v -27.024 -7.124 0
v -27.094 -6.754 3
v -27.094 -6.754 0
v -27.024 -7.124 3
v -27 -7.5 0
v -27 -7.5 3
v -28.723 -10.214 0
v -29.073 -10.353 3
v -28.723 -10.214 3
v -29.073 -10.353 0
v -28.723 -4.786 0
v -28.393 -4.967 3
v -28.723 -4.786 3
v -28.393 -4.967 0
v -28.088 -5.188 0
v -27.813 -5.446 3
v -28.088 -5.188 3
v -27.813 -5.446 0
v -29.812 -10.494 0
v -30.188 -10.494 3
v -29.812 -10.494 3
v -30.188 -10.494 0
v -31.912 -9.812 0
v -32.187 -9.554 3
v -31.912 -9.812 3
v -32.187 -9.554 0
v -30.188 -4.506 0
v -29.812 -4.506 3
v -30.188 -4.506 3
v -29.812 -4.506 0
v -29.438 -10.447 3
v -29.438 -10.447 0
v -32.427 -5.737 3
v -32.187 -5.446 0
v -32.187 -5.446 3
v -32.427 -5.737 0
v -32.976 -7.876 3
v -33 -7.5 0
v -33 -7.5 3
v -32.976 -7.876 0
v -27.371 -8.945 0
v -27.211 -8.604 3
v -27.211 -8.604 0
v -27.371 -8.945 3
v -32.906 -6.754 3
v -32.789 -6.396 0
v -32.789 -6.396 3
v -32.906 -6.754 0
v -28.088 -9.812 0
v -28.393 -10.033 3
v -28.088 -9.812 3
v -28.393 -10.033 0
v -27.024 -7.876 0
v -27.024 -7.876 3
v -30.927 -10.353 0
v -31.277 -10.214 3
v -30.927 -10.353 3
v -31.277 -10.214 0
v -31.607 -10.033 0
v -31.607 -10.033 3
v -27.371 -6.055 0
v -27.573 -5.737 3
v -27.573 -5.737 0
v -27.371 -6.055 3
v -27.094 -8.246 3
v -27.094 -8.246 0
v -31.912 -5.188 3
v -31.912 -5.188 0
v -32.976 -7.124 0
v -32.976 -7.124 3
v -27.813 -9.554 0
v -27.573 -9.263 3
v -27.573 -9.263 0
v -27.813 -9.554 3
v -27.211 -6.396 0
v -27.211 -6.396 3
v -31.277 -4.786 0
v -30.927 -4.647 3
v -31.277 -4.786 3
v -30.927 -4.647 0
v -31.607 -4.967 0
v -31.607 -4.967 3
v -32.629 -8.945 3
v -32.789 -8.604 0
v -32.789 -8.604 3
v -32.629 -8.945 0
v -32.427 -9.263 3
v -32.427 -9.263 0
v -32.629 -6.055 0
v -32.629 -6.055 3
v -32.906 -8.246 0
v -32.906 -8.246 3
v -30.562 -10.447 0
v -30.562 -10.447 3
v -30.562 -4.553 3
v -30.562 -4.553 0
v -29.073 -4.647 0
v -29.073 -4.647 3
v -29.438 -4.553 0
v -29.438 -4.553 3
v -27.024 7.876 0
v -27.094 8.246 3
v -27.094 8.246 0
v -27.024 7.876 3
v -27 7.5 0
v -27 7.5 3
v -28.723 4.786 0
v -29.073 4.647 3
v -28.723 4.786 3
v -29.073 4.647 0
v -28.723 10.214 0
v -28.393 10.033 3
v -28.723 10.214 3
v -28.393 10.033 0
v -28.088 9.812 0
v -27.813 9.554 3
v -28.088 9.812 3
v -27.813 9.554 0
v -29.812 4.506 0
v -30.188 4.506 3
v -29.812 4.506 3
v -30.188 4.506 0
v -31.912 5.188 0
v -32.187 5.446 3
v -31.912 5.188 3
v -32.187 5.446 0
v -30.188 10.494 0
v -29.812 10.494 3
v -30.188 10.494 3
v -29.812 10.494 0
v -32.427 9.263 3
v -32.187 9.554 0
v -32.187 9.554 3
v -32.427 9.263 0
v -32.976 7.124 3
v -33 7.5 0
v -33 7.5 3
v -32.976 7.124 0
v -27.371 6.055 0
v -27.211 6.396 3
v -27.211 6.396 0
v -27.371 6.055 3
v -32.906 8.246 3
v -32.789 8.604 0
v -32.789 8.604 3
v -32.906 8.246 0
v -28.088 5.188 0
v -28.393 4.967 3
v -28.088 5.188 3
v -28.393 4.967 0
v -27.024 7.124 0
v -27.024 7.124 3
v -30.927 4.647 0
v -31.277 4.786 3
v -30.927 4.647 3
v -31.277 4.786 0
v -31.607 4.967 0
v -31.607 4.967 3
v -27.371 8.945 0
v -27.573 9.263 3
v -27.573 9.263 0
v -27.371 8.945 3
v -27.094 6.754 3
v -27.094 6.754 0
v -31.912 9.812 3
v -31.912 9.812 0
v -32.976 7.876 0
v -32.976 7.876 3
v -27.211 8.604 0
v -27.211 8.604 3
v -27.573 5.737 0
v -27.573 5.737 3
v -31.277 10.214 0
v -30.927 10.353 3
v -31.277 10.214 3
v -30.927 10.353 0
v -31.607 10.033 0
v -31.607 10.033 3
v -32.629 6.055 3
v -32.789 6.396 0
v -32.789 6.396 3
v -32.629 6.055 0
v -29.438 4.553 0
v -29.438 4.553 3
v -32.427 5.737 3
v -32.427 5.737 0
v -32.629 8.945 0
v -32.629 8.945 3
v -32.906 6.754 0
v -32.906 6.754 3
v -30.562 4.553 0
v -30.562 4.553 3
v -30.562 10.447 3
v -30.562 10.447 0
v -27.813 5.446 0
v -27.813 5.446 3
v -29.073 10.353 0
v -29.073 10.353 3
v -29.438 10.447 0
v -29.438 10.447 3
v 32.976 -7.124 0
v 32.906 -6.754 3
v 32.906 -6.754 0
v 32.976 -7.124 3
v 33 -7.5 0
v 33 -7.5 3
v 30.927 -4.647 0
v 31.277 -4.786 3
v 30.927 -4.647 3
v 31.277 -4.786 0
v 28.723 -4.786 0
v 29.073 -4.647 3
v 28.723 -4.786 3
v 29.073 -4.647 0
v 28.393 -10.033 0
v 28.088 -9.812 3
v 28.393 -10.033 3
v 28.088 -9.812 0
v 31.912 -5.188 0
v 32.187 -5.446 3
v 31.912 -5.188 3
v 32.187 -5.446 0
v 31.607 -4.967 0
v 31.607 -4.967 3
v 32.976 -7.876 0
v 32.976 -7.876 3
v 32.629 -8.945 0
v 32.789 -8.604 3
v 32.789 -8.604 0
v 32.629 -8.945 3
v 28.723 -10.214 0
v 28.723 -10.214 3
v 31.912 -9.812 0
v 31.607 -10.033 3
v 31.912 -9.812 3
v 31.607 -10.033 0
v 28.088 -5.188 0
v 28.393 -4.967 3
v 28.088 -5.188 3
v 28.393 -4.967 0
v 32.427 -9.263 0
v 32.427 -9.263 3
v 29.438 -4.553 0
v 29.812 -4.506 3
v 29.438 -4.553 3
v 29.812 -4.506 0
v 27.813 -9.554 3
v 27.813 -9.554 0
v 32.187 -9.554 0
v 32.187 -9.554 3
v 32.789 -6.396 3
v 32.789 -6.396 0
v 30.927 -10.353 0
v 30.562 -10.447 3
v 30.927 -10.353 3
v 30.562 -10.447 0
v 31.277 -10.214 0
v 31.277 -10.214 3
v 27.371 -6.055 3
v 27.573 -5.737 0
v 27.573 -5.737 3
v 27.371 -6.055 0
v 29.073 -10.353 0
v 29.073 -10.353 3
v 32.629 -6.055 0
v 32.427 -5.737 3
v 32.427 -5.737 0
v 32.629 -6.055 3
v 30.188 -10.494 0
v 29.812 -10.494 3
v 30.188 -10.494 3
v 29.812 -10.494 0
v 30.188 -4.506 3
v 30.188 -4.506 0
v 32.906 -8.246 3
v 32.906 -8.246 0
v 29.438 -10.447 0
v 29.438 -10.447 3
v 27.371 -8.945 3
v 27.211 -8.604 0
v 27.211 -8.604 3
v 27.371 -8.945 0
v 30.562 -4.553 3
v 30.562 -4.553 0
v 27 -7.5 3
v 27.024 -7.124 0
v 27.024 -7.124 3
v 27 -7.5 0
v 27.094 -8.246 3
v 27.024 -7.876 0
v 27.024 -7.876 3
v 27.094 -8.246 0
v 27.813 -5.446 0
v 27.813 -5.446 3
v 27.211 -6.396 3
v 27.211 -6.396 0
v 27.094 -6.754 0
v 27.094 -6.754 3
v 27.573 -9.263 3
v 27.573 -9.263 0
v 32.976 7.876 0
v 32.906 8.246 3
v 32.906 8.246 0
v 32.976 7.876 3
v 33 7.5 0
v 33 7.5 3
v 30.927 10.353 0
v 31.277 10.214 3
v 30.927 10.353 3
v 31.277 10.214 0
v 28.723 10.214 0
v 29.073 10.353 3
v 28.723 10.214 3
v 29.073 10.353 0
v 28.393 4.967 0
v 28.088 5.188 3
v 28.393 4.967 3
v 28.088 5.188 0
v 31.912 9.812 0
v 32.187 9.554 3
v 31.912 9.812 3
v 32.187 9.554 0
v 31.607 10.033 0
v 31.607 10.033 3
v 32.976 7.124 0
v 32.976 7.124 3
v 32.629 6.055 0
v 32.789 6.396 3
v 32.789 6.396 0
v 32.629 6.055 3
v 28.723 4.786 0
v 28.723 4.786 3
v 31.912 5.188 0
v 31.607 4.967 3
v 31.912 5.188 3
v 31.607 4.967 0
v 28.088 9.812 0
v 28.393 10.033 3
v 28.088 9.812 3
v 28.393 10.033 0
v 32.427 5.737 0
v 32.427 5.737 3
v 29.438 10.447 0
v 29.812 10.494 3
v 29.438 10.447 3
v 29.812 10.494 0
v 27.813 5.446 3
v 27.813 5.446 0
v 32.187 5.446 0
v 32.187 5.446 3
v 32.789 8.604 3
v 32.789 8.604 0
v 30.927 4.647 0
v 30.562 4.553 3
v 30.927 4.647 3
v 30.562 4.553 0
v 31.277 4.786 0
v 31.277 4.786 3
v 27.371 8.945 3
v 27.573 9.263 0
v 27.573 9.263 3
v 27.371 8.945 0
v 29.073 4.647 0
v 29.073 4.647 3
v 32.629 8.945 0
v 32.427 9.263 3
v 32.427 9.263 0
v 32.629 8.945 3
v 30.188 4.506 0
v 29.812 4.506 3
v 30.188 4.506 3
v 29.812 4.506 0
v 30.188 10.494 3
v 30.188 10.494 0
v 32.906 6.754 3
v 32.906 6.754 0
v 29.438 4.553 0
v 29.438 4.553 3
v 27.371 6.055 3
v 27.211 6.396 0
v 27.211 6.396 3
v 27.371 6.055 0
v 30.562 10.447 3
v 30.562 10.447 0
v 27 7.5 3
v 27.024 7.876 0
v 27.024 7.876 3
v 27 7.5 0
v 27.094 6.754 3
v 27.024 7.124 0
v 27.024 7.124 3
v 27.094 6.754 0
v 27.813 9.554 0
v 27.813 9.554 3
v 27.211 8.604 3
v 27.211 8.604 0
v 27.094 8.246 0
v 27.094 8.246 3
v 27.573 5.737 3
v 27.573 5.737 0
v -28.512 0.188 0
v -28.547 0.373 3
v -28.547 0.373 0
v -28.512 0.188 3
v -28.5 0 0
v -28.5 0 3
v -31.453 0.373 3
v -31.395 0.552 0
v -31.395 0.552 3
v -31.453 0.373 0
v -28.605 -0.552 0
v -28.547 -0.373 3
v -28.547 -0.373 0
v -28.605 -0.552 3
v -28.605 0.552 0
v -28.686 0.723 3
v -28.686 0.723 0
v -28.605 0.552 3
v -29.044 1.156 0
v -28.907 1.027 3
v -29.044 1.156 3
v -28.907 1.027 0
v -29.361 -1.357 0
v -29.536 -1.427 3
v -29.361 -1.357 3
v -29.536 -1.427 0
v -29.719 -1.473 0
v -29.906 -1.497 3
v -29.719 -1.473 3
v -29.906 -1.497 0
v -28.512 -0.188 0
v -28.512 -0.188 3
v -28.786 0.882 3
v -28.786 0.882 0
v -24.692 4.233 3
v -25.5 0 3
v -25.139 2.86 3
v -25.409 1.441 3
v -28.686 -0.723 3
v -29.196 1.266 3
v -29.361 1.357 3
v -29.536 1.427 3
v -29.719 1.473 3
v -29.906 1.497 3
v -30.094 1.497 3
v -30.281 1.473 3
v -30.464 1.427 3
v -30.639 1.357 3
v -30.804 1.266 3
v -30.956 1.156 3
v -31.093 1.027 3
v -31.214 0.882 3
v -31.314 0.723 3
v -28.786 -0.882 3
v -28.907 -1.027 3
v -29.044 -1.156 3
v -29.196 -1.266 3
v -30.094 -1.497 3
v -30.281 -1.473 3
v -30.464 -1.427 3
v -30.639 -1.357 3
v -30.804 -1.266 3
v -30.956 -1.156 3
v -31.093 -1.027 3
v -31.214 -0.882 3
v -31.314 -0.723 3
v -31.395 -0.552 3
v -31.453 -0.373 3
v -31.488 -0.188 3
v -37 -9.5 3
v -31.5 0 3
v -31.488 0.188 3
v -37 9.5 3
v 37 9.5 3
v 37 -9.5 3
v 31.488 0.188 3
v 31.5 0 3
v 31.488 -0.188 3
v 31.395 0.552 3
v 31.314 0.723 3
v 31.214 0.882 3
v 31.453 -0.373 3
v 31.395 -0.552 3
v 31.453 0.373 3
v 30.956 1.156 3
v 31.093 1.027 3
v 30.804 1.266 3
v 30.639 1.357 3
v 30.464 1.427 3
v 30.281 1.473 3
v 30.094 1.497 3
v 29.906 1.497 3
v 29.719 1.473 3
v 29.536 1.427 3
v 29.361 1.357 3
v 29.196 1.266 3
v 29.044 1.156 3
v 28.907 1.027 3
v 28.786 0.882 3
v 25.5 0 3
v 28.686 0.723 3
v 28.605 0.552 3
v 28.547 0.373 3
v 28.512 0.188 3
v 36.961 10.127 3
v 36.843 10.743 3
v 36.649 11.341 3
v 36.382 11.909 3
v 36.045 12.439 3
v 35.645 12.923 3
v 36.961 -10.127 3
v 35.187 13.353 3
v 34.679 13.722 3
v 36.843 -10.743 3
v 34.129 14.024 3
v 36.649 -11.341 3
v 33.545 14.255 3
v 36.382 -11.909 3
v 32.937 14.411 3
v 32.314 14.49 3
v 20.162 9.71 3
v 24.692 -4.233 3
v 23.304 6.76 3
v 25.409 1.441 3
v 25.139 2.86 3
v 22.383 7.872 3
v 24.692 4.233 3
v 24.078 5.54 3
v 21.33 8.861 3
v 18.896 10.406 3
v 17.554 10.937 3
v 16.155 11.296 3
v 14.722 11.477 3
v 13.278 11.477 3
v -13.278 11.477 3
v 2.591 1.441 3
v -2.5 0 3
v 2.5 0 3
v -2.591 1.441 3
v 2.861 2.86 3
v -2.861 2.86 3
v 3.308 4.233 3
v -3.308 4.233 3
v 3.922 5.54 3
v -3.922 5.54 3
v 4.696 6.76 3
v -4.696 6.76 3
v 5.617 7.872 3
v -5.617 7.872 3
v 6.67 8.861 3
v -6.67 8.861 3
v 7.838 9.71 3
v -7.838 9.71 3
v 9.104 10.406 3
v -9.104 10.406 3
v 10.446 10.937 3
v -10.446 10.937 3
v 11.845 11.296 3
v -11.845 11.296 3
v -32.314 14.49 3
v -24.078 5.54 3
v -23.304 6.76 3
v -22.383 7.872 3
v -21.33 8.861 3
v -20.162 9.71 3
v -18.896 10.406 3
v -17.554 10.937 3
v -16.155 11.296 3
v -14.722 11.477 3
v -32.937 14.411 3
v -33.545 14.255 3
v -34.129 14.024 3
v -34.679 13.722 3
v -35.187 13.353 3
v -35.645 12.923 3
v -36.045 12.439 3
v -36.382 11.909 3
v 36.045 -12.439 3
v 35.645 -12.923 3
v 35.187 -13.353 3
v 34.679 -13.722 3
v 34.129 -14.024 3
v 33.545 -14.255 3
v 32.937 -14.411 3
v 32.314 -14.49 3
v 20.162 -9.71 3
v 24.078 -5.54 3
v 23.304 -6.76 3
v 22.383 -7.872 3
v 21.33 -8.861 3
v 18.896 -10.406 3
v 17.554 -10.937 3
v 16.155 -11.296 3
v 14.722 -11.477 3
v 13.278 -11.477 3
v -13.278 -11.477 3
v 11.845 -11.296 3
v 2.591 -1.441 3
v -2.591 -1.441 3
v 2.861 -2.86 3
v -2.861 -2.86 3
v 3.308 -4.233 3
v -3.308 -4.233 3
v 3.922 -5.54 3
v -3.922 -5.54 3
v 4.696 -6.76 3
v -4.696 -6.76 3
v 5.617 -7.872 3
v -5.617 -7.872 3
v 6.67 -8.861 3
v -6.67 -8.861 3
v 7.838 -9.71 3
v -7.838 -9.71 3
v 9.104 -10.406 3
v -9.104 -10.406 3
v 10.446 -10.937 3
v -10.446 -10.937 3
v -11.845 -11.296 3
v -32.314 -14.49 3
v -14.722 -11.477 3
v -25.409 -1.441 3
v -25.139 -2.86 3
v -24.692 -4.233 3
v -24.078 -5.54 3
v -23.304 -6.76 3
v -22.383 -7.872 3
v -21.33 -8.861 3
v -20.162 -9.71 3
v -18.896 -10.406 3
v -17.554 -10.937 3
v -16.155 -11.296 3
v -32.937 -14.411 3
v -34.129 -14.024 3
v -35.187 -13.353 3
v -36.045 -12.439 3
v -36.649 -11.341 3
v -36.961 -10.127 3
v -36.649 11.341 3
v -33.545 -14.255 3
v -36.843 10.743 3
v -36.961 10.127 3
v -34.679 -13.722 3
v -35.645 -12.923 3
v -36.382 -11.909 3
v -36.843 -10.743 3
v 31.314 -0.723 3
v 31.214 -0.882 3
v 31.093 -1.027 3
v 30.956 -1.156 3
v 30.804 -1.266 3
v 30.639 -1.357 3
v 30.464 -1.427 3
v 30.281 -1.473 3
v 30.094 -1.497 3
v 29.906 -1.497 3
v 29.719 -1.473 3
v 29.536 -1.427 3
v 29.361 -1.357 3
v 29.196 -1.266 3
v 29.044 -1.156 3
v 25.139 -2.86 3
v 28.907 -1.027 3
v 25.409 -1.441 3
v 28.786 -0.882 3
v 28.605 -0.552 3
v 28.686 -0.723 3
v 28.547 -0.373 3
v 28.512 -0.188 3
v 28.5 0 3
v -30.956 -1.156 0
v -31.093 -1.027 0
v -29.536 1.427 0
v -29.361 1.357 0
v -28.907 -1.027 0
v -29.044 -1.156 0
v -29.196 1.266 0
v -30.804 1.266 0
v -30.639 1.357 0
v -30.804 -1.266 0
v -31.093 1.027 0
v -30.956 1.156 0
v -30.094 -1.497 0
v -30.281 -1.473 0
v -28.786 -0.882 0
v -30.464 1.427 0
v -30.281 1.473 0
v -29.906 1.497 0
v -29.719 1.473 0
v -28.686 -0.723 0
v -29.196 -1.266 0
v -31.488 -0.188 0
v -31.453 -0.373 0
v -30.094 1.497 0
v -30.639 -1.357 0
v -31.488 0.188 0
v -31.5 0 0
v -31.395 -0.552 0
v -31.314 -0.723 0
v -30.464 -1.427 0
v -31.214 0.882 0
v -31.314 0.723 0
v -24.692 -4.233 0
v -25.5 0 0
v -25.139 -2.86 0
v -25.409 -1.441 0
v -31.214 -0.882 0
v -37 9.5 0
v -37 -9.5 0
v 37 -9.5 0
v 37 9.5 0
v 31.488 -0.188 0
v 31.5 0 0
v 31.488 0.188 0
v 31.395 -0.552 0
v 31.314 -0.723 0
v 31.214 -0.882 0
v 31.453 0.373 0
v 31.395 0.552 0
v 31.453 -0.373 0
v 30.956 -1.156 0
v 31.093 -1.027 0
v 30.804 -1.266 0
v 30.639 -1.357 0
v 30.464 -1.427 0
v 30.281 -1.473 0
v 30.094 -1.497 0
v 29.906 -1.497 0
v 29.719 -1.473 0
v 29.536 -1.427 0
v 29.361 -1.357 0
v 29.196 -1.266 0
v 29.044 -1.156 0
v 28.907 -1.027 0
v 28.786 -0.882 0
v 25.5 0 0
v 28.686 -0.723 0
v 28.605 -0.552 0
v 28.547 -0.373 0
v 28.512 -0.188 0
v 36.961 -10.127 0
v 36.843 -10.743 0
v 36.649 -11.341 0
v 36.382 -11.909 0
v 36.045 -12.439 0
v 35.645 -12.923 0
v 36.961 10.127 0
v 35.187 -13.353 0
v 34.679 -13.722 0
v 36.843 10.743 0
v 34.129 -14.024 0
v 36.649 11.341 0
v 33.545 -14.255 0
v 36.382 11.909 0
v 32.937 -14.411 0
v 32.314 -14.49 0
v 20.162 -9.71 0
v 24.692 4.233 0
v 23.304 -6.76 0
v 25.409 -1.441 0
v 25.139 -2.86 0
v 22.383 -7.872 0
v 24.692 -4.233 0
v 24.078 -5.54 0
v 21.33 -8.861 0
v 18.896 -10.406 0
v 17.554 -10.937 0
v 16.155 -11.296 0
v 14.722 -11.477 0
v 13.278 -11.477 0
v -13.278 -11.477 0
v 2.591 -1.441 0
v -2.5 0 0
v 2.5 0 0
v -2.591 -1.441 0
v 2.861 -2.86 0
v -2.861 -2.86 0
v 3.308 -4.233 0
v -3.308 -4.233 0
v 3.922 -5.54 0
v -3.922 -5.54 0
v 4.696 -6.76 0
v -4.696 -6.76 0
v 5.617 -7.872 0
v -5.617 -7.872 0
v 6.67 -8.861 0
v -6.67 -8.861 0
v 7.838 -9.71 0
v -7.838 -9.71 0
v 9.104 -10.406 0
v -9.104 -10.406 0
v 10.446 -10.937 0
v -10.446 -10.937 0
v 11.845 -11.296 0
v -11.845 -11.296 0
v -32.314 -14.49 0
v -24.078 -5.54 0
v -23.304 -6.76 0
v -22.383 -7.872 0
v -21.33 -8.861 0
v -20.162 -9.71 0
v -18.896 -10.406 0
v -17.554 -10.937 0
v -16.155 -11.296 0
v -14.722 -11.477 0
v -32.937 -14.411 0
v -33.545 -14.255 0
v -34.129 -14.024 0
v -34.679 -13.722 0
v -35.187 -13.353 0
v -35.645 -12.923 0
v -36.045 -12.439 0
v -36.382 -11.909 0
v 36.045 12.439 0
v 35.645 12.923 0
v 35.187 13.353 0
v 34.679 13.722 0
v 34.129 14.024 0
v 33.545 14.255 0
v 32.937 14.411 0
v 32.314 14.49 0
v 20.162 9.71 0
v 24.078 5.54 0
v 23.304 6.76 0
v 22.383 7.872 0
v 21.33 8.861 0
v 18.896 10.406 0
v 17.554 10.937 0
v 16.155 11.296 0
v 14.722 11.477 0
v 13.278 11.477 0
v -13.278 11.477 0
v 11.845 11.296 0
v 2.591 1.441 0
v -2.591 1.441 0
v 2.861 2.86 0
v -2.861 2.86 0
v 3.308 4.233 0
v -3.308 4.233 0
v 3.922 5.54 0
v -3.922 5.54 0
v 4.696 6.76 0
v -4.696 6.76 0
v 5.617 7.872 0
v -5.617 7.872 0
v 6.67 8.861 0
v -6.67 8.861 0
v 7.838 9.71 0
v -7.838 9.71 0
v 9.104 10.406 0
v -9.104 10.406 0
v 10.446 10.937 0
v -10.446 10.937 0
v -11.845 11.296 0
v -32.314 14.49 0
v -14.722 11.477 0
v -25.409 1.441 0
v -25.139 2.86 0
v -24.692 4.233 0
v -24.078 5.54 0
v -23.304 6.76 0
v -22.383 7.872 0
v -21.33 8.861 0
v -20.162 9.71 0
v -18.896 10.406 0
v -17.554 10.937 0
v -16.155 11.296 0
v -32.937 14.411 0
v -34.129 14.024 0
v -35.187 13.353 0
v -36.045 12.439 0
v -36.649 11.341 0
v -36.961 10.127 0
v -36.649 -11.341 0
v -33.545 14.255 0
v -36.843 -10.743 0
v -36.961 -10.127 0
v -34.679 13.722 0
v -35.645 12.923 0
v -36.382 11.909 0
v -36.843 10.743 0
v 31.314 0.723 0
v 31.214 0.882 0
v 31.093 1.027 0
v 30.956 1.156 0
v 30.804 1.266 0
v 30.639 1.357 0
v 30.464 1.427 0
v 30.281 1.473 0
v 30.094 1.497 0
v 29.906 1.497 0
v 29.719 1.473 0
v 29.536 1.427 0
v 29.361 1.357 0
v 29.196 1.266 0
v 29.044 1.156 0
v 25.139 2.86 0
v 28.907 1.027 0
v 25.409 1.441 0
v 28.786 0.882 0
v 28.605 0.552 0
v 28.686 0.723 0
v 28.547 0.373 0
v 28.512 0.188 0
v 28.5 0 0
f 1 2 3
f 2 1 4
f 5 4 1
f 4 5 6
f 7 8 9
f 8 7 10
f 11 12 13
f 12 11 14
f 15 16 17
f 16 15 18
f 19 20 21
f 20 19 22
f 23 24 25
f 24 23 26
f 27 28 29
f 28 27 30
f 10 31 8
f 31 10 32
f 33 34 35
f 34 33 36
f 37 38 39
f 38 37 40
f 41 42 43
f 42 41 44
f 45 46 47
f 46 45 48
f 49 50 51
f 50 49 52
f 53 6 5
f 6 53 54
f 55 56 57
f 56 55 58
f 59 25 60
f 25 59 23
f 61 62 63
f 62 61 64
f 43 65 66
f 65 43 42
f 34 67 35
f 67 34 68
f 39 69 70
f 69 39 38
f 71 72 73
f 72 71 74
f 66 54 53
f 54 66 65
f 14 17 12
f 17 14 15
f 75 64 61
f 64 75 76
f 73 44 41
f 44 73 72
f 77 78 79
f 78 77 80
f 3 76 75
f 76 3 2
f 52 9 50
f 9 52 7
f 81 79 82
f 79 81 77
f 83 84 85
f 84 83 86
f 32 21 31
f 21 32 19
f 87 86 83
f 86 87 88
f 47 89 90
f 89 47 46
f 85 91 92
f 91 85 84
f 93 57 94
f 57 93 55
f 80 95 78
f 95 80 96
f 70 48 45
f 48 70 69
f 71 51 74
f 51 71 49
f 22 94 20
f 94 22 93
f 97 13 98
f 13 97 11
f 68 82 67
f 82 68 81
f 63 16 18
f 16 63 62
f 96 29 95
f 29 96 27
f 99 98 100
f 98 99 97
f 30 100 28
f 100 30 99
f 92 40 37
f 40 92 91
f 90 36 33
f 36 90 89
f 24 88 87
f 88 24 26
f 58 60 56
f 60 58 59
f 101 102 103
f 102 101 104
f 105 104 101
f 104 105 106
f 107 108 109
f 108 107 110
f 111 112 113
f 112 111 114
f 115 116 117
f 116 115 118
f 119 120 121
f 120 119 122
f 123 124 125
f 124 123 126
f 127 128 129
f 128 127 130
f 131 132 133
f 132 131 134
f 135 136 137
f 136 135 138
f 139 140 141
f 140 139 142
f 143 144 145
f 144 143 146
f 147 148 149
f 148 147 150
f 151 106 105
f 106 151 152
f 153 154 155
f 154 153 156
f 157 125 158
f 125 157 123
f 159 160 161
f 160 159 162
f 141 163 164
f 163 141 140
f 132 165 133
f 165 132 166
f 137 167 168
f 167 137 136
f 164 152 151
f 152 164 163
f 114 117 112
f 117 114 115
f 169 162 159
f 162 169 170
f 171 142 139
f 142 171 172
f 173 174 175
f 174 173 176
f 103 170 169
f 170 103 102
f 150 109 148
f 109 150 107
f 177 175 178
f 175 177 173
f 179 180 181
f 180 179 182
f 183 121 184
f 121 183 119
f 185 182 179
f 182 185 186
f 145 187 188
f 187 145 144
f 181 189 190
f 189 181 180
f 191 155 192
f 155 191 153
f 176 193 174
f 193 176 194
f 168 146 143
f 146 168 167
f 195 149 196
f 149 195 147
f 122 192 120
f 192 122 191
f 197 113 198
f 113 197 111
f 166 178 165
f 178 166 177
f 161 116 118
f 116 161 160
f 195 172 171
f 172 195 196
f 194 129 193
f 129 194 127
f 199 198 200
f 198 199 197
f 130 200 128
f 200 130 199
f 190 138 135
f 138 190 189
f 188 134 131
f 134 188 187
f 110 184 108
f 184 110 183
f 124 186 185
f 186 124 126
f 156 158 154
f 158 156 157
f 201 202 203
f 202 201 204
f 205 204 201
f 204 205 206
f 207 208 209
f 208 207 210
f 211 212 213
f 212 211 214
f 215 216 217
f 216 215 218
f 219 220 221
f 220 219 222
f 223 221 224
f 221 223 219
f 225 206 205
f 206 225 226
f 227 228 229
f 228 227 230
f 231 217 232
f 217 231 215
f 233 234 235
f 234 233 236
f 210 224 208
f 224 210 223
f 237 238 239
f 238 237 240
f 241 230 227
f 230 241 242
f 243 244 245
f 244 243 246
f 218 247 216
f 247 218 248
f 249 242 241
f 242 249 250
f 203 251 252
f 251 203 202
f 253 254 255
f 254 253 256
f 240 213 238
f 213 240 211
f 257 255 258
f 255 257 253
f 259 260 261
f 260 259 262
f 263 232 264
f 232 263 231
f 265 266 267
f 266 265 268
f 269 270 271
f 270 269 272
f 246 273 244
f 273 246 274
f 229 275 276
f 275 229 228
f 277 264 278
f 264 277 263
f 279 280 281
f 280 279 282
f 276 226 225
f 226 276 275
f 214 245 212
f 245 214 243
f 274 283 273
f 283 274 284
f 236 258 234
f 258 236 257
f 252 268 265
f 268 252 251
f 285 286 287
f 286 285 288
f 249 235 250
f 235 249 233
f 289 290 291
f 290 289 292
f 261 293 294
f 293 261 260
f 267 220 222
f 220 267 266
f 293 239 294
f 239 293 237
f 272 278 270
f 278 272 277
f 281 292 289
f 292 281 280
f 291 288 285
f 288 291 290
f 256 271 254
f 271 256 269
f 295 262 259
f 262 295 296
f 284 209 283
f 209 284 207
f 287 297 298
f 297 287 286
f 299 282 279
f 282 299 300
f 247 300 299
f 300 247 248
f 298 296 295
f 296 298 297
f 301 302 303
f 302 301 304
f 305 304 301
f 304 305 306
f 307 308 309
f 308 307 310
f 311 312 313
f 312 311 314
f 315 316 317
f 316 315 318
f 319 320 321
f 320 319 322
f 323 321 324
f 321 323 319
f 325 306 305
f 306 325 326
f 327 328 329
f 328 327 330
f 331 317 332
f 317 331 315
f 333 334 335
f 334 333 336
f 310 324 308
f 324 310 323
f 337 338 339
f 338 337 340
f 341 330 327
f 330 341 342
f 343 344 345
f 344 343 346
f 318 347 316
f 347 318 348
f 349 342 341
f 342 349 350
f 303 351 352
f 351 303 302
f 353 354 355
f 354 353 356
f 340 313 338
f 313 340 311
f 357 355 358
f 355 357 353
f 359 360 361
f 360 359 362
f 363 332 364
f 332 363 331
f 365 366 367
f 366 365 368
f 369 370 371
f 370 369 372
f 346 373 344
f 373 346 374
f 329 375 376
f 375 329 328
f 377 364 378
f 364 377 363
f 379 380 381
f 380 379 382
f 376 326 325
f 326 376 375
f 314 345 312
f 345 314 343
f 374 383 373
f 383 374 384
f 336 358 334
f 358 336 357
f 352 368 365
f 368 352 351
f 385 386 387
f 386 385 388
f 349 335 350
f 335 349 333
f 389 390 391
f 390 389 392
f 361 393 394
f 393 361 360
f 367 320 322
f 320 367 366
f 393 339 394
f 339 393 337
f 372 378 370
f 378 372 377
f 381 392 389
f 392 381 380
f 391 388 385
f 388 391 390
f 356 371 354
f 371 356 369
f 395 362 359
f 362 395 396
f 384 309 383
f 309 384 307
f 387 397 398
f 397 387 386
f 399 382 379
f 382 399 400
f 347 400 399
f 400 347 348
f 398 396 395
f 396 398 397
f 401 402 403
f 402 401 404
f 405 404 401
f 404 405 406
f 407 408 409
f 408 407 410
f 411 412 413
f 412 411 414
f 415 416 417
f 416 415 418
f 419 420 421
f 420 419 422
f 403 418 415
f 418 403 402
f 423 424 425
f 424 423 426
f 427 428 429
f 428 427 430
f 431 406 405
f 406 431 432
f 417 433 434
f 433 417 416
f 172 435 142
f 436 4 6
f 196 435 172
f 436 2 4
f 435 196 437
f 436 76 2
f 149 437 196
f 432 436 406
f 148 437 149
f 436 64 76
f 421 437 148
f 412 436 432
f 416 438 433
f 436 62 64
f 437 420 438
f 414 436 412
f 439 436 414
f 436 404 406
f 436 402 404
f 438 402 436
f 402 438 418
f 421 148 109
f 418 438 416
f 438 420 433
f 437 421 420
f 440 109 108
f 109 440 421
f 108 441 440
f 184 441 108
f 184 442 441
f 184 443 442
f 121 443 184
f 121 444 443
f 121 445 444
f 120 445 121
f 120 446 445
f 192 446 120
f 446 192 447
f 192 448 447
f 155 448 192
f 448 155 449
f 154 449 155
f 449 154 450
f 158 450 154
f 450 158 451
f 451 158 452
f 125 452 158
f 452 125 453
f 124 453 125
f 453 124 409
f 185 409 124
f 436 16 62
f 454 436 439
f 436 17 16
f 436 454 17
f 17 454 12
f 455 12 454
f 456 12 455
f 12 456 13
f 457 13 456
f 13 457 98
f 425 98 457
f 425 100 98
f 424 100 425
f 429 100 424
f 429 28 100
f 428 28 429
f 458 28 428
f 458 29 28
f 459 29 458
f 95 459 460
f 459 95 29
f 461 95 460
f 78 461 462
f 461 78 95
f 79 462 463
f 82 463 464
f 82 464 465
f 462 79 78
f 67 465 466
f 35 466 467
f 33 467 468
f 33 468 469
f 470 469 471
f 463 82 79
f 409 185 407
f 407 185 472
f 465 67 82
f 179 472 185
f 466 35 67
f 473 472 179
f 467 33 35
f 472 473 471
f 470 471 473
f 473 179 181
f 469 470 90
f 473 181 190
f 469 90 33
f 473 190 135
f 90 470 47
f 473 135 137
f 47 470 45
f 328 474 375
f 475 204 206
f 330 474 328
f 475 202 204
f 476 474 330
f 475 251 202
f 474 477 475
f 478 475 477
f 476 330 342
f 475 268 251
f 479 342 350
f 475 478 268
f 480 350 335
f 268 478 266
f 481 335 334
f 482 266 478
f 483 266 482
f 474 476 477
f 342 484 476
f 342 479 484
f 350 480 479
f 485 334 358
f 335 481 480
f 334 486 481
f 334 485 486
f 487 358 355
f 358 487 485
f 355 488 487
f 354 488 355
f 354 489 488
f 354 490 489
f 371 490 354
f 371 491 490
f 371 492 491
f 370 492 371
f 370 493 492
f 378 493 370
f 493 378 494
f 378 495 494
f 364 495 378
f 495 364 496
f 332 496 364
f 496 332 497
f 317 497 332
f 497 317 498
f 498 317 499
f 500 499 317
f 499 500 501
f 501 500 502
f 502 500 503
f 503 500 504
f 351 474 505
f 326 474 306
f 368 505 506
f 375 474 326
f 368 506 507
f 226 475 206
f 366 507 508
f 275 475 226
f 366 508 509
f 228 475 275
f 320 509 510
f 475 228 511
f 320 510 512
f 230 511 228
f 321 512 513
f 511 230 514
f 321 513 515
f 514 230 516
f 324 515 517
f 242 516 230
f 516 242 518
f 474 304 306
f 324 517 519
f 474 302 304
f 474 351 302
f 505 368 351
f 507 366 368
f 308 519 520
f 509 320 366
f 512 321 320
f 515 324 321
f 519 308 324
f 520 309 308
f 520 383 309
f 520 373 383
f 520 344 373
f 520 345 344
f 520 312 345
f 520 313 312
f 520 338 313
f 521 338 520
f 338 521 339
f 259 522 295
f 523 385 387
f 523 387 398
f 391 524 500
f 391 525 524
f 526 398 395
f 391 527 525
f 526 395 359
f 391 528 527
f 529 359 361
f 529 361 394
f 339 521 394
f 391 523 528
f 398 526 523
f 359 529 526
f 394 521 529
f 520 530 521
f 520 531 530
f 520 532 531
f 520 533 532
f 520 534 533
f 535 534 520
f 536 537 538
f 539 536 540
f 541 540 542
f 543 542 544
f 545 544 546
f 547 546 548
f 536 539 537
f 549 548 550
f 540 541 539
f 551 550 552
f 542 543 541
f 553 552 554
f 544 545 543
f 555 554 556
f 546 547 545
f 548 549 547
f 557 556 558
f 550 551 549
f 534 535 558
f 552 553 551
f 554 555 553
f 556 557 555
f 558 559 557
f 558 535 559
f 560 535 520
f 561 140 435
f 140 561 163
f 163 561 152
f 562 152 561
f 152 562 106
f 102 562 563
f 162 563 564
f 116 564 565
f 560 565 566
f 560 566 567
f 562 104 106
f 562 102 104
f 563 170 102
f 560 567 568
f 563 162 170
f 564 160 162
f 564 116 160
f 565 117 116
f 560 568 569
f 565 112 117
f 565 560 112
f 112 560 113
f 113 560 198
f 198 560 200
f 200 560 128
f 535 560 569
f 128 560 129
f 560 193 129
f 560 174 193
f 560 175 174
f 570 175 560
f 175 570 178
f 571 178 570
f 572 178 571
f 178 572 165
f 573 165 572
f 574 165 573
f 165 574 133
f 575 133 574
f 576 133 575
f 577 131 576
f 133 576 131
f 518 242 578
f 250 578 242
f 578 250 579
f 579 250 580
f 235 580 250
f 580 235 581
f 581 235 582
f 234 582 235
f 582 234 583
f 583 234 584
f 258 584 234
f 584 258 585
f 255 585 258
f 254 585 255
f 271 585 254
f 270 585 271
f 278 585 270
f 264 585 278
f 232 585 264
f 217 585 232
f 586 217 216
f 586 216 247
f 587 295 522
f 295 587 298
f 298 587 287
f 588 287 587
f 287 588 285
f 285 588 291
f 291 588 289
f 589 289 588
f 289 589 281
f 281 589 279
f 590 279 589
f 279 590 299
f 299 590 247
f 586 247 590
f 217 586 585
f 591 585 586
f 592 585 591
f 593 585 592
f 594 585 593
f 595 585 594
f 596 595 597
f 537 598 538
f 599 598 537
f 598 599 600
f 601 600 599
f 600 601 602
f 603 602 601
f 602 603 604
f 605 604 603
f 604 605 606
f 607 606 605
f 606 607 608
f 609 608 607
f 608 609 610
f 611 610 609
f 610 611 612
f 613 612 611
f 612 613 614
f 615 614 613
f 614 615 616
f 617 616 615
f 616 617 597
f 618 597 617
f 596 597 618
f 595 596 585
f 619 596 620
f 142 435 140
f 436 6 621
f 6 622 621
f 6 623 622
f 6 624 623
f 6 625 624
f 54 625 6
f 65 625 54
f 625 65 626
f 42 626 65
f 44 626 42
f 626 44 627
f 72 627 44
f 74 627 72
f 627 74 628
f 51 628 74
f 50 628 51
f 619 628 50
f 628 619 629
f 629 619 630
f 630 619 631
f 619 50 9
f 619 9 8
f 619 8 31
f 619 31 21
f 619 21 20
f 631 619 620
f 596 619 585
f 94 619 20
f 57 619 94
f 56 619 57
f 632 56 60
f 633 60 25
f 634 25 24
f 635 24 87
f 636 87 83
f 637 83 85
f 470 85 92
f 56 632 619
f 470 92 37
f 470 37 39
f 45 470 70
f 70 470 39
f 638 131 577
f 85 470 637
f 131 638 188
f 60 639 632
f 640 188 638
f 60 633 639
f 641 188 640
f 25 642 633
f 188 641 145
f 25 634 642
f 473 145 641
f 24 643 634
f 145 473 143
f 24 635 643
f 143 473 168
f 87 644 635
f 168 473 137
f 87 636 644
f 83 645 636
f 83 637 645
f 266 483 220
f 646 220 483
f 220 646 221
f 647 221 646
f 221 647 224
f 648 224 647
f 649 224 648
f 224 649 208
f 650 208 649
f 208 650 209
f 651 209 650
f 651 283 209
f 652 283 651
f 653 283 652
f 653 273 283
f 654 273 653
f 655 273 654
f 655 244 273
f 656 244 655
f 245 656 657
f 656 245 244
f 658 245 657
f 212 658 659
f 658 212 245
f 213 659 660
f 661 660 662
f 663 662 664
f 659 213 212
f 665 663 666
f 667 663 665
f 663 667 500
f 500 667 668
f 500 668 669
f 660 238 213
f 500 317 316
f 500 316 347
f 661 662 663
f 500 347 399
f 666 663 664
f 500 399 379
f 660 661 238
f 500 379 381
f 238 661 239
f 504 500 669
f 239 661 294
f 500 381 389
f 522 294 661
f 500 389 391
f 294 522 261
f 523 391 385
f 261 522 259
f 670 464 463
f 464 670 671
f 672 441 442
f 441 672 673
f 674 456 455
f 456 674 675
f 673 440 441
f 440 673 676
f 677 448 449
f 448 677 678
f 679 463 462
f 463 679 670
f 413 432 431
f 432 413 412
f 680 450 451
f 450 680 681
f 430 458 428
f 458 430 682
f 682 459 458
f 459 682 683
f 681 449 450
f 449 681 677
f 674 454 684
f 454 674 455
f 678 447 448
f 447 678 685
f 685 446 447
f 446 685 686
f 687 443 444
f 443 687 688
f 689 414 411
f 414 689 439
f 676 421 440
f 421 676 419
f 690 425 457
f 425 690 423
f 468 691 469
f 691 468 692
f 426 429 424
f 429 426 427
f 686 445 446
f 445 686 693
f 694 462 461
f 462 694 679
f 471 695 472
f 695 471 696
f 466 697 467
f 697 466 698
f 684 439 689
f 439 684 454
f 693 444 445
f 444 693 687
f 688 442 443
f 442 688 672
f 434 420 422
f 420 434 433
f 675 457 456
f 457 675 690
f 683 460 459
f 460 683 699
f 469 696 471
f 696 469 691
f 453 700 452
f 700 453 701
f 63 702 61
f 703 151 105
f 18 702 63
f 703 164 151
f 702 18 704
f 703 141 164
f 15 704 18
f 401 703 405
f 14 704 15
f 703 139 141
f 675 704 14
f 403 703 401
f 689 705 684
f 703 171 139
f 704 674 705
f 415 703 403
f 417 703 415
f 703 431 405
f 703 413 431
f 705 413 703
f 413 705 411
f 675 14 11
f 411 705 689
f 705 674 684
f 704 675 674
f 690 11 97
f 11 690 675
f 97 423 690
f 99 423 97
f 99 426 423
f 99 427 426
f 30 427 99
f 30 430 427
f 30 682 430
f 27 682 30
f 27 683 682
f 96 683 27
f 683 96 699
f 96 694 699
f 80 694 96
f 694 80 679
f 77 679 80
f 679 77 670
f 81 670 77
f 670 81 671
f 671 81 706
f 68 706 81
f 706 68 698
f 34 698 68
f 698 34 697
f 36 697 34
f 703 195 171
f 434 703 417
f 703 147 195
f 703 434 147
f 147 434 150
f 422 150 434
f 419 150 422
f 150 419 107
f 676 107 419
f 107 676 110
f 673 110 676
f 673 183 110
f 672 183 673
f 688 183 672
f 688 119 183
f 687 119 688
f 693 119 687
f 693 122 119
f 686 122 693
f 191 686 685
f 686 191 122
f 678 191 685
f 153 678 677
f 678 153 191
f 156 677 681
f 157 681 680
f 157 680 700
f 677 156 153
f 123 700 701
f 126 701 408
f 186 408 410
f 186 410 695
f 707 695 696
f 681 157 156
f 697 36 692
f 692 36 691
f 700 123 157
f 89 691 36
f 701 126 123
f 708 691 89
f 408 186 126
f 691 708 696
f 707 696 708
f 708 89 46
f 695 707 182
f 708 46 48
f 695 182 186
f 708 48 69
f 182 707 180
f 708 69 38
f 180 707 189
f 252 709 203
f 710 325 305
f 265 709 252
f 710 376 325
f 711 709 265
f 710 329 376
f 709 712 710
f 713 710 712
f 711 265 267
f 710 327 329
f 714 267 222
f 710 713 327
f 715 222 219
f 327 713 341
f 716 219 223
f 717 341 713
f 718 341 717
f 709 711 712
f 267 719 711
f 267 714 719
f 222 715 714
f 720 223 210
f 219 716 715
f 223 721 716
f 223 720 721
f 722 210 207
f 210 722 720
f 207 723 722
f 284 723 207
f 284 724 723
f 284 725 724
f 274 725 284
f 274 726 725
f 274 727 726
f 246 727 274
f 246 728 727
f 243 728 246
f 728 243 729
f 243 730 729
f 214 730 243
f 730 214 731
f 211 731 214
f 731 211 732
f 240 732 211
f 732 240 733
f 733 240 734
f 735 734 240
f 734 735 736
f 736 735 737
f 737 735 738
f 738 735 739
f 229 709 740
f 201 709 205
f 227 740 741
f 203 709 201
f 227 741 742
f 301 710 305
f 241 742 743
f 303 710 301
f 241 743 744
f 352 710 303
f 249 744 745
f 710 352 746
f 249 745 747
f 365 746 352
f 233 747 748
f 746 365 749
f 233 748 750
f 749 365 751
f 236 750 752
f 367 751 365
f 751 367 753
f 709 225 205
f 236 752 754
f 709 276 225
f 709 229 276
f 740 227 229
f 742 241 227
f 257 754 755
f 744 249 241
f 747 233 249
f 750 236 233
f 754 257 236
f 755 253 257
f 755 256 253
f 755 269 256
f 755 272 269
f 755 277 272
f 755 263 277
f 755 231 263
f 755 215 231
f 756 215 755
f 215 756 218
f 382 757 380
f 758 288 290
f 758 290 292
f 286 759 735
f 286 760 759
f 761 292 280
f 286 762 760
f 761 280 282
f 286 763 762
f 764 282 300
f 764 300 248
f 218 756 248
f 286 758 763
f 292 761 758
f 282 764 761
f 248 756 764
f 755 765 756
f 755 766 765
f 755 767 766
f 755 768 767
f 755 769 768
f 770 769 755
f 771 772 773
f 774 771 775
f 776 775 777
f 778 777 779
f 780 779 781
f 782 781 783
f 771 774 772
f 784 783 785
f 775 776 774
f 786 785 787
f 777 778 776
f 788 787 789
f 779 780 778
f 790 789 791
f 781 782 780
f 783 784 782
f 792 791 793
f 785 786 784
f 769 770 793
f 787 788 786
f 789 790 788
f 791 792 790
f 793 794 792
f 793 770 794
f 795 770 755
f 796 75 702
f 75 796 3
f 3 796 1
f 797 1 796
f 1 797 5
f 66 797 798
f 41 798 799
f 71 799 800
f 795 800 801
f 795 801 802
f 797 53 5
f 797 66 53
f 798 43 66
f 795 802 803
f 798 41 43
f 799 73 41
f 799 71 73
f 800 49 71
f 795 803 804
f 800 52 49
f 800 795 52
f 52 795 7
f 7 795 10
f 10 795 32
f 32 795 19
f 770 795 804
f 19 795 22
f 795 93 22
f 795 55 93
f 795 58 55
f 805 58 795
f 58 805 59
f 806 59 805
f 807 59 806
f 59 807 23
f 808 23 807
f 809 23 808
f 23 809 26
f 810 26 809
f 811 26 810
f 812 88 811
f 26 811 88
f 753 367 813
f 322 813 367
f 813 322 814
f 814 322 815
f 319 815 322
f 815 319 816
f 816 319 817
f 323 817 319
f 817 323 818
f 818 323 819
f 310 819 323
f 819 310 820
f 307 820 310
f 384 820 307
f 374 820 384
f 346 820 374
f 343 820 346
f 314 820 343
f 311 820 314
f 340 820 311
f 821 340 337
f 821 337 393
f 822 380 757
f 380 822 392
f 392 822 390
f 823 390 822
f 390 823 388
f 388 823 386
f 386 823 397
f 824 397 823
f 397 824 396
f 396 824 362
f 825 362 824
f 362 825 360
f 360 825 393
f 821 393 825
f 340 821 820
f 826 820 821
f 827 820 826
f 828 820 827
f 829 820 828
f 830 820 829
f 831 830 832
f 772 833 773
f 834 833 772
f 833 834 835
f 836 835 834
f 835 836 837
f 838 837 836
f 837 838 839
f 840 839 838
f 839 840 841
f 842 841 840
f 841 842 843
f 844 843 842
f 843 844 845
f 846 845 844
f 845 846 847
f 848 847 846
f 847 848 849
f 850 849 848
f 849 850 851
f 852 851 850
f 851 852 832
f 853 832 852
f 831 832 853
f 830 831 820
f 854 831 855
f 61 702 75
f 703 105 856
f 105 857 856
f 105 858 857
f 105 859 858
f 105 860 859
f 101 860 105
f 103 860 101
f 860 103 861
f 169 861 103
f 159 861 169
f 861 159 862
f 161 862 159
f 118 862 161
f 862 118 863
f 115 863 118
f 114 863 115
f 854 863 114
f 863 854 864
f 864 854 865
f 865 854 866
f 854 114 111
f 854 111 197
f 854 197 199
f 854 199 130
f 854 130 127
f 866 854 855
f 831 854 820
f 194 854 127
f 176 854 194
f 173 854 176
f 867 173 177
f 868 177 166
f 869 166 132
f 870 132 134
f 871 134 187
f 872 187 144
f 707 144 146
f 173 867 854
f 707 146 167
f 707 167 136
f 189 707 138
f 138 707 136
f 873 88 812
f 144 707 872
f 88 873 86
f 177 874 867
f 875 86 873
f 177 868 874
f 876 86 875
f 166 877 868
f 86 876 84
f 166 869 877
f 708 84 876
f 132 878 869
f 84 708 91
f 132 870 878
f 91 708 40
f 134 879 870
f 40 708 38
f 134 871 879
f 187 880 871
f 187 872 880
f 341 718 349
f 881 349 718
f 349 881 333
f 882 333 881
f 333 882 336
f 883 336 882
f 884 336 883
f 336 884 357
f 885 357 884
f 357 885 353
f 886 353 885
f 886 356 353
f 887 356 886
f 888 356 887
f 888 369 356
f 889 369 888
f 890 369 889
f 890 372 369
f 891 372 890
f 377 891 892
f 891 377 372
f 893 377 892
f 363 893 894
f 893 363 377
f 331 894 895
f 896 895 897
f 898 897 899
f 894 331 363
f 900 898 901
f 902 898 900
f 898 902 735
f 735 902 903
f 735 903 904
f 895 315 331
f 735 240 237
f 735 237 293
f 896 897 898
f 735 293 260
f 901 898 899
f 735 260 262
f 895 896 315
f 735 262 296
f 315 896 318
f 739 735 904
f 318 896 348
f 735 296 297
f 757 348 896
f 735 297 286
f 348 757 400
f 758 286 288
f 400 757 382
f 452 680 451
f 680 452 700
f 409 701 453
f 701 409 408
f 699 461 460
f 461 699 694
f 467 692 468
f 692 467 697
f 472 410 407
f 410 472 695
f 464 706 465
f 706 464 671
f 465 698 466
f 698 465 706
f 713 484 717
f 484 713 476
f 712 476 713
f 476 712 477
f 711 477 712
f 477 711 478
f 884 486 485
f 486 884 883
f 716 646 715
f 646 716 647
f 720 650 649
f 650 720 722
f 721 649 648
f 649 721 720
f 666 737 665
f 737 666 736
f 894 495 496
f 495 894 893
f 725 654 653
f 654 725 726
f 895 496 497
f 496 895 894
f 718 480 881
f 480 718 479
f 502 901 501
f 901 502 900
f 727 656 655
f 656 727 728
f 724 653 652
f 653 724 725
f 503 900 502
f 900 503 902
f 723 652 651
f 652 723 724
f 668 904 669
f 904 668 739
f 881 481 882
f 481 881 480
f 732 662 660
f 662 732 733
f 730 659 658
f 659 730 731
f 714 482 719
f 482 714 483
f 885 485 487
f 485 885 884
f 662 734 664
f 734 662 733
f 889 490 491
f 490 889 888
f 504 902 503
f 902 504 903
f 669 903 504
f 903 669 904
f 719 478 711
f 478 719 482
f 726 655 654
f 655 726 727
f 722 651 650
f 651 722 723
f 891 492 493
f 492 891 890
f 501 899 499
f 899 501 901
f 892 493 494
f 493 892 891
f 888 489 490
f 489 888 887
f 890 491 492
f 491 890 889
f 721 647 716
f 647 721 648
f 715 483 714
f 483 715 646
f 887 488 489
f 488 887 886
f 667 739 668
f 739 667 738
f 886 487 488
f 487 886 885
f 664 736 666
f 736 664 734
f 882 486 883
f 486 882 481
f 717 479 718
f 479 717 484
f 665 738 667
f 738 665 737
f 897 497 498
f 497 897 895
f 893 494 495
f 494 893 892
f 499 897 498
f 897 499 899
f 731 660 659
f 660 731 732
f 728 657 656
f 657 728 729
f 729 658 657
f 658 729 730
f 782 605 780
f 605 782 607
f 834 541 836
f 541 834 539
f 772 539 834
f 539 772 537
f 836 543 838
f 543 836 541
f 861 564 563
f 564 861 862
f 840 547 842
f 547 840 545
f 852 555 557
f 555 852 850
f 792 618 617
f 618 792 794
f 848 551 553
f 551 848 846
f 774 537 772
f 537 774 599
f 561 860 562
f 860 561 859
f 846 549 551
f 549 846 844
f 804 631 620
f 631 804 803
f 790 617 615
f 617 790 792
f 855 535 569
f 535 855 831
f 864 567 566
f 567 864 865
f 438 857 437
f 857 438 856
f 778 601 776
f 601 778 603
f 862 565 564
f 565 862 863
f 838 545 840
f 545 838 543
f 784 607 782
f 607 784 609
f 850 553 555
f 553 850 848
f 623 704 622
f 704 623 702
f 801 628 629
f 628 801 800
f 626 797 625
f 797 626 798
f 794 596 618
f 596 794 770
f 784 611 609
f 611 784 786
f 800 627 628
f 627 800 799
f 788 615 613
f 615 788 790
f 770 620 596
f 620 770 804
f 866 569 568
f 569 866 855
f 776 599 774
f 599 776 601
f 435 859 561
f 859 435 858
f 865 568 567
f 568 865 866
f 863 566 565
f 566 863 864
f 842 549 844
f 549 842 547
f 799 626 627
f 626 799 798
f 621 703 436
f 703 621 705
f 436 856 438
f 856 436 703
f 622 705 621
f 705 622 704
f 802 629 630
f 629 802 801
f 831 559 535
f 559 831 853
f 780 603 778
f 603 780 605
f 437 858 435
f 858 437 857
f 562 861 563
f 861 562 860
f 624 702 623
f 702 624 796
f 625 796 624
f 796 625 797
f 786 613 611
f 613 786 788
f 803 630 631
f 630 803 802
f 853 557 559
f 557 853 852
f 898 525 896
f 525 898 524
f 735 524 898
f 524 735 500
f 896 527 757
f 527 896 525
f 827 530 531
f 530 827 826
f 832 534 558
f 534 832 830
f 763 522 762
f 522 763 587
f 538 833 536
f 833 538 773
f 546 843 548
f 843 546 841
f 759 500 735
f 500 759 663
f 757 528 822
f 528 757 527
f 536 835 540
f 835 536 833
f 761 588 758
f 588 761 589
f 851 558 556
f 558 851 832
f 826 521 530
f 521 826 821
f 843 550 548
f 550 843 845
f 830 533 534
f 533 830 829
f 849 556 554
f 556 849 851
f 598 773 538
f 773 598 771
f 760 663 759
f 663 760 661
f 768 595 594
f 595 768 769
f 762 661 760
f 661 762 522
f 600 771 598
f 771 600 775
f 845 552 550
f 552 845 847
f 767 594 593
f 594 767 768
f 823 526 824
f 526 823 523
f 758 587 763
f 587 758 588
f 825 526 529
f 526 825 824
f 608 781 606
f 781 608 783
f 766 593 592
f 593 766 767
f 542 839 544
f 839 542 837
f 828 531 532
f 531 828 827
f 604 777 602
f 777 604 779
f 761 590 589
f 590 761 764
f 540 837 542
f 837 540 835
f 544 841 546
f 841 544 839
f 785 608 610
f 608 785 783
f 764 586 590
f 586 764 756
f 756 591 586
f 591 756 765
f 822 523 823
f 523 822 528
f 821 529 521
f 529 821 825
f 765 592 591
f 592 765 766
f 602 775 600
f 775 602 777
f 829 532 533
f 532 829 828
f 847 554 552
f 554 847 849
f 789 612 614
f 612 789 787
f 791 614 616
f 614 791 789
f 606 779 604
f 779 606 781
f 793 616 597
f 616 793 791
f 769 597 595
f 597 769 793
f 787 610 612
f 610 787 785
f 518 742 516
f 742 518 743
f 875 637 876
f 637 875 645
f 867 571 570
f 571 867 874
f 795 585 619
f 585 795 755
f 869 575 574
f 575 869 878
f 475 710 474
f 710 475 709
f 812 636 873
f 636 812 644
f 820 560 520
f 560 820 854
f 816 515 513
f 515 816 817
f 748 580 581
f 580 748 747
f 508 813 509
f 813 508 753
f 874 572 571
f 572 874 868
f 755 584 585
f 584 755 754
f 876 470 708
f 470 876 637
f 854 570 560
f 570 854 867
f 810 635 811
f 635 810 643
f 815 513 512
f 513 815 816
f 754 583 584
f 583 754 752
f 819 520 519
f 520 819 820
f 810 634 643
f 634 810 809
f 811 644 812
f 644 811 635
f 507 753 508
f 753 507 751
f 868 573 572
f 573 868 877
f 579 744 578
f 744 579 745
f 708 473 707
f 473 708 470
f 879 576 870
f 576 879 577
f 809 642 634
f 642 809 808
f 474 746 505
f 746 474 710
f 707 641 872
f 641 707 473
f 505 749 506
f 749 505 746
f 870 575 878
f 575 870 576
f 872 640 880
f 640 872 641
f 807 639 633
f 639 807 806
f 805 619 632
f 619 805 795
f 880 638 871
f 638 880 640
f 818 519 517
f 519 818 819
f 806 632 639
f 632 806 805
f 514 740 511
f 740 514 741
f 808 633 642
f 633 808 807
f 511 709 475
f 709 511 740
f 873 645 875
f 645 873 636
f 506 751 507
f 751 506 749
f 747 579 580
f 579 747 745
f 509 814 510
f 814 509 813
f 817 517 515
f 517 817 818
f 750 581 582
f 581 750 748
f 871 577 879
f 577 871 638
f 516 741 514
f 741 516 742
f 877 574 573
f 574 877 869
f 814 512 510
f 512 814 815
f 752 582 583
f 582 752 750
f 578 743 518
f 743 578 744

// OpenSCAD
$fn = 50;


difference() {
	union() {
		hull() {
			translate(v = [-32.0000000000, 9.5000000000, 0]) {
				cylinder(h = 3, r = 5);
			}
			translate(v = [32.0000000000, 9.5000000000, 0]) {
				cylinder(h = 3, r = 5);
			}
			translate(v = [-32.0000000000, -9.5000000000, 0]) {
				cylinder(h = 3, r = 5);
			}
			translate(v = [32.0000000000, -9.5000000000, 0]) {
				cylinder(h = 3, r = 5);
			}
		}
	}
	union() {
		#translate(v = [-30.0000000000, -7.5000000000, 0]) {
			cylinder(h = 3, r = 3.0000000000);
		}
		#translate(v = [-30.0000000000, 7.5000000000, 0]) {
			cylinder(h = 3, r = 3.0000000000);
		}
		#translate(v = [30.0000000000, -7.5000000000, 0]) {
			cylinder(h = 3, r = 3.0000000000);
		}
		#translate(v = [30.0000000000, 7.5000000000, 0]) {
			cylinder(h = 3, r = 3.0000000000);
		}
		#translate(v = [-30.0000000000, -7.5000000000, -100.0000000000]) {
			cylinder(h = 200, r = 3.0000000000);
		}
		#translate(v = [-30.0000000000, 7.5000000000, -100.0000000000]) {
			cylinder(h = 200, r = 3.0000000000);
		}
		#translate(v = [30.0000000000, -7.5000000000, -100.0000000000]) {
			cylinder(h = 200, r = 3.0000000000);
		}
		#translate(v = [30.0000000000, 7.5000000000, -100.0000000000]) {
			cylinder(h = 200, r = 3.0000000000);
		}
		#translate(v = [-30.0000000000, -7.5000000000, 0]) {
			cylinder(h = 3, r = 1.5000000000);
		}
		#translate(v = [-30.0000000000, 0.0000000000, 0]) {
			cylinder(h = 3, r = 1.5000000000);
		}
		#translate(v = [-30.0000000000, 7.5000000000, 0]) {
			cylinder(h = 3, r = 1.5000000000);
		}
		#translate(v = [30.0000000000, -7.5000000000, 0]) {
			cylinder(h = 3, r = 1.5000000000);
		}
		#translate(v = [30.0000000000, 0.0000000000, 0]) {
			cylinder(h = 3, r = 1.5000000000);
		}
		#translate(v = [30.0000000000, 7.5000000000, 0]) {
			cylinder(h = 3, r = 1.5000000000);
		}
		#translate(v = [-30.0000000000, -7.5000000000, 0]) {
			cylinder(h = 3, r = 1.5000000000);
		}
		#translate(v = [-30.0000000000, 0.0000000000, 0]) {
			cylinder(h = 3, r = 1.5000000000);
		}
		#translate(v = [-30.0000000000, 7.5000000000, 0]) {
			cylinder(h = 3, r = 1.5000000000);
		}
		#translate(v = [30.0000000000, -7.5000000000, 0]) {
			cylinder(h = 3, r = 1.5000000000);
		}
		#translate(v = [30.0000000000, 0.0000000000, 0]) {
			cylinder(h = 3, r = 1.5000000000);
		}
		#translate(v = [30.0000000000, 7.5000000000, 0]) {
			cylinder(h = 3, r = 1.5000000000);
		}
		#translate(v = [-30.0000000000, -7.5000000000, 0]) {
			cylinder(h = 3, r = 1.5000000000);
		}
		#translate(v = [-30.0000000000, 0.0000000000, 0]) {
			cylinder(h = 3, r = 1.5000000000);
		}
		#translate(v = [-30.0000000000, 7.5000000000, 0]) {
			cylinder(h = 3, r = 1.5000000000);
		}
		#translate(v = [30.0000000000, -7.5000000000, 0]) {
			cylinder(h = 3, r = 1.5000000000);
		}
		#translate(v = [30.0000000000, 0.0000000000, 0]) {
			cylinder(h = 3, r = 1.5000000000);
		}
		#translate(v = [30.0000000000, 7.5000000000, 0]) {
			cylinder(h = 3, r = 1.5000000000);
		}
		#translate(v = [-14.0000000000, 0, 0]) {
			cylinder(h = 3, r = 11.5000000000);
		}
		#translate(v = [14.0000000000, 0, 0]) {
			cylinder(h = 3, r = 11.5000000000);
		}
	}
}
